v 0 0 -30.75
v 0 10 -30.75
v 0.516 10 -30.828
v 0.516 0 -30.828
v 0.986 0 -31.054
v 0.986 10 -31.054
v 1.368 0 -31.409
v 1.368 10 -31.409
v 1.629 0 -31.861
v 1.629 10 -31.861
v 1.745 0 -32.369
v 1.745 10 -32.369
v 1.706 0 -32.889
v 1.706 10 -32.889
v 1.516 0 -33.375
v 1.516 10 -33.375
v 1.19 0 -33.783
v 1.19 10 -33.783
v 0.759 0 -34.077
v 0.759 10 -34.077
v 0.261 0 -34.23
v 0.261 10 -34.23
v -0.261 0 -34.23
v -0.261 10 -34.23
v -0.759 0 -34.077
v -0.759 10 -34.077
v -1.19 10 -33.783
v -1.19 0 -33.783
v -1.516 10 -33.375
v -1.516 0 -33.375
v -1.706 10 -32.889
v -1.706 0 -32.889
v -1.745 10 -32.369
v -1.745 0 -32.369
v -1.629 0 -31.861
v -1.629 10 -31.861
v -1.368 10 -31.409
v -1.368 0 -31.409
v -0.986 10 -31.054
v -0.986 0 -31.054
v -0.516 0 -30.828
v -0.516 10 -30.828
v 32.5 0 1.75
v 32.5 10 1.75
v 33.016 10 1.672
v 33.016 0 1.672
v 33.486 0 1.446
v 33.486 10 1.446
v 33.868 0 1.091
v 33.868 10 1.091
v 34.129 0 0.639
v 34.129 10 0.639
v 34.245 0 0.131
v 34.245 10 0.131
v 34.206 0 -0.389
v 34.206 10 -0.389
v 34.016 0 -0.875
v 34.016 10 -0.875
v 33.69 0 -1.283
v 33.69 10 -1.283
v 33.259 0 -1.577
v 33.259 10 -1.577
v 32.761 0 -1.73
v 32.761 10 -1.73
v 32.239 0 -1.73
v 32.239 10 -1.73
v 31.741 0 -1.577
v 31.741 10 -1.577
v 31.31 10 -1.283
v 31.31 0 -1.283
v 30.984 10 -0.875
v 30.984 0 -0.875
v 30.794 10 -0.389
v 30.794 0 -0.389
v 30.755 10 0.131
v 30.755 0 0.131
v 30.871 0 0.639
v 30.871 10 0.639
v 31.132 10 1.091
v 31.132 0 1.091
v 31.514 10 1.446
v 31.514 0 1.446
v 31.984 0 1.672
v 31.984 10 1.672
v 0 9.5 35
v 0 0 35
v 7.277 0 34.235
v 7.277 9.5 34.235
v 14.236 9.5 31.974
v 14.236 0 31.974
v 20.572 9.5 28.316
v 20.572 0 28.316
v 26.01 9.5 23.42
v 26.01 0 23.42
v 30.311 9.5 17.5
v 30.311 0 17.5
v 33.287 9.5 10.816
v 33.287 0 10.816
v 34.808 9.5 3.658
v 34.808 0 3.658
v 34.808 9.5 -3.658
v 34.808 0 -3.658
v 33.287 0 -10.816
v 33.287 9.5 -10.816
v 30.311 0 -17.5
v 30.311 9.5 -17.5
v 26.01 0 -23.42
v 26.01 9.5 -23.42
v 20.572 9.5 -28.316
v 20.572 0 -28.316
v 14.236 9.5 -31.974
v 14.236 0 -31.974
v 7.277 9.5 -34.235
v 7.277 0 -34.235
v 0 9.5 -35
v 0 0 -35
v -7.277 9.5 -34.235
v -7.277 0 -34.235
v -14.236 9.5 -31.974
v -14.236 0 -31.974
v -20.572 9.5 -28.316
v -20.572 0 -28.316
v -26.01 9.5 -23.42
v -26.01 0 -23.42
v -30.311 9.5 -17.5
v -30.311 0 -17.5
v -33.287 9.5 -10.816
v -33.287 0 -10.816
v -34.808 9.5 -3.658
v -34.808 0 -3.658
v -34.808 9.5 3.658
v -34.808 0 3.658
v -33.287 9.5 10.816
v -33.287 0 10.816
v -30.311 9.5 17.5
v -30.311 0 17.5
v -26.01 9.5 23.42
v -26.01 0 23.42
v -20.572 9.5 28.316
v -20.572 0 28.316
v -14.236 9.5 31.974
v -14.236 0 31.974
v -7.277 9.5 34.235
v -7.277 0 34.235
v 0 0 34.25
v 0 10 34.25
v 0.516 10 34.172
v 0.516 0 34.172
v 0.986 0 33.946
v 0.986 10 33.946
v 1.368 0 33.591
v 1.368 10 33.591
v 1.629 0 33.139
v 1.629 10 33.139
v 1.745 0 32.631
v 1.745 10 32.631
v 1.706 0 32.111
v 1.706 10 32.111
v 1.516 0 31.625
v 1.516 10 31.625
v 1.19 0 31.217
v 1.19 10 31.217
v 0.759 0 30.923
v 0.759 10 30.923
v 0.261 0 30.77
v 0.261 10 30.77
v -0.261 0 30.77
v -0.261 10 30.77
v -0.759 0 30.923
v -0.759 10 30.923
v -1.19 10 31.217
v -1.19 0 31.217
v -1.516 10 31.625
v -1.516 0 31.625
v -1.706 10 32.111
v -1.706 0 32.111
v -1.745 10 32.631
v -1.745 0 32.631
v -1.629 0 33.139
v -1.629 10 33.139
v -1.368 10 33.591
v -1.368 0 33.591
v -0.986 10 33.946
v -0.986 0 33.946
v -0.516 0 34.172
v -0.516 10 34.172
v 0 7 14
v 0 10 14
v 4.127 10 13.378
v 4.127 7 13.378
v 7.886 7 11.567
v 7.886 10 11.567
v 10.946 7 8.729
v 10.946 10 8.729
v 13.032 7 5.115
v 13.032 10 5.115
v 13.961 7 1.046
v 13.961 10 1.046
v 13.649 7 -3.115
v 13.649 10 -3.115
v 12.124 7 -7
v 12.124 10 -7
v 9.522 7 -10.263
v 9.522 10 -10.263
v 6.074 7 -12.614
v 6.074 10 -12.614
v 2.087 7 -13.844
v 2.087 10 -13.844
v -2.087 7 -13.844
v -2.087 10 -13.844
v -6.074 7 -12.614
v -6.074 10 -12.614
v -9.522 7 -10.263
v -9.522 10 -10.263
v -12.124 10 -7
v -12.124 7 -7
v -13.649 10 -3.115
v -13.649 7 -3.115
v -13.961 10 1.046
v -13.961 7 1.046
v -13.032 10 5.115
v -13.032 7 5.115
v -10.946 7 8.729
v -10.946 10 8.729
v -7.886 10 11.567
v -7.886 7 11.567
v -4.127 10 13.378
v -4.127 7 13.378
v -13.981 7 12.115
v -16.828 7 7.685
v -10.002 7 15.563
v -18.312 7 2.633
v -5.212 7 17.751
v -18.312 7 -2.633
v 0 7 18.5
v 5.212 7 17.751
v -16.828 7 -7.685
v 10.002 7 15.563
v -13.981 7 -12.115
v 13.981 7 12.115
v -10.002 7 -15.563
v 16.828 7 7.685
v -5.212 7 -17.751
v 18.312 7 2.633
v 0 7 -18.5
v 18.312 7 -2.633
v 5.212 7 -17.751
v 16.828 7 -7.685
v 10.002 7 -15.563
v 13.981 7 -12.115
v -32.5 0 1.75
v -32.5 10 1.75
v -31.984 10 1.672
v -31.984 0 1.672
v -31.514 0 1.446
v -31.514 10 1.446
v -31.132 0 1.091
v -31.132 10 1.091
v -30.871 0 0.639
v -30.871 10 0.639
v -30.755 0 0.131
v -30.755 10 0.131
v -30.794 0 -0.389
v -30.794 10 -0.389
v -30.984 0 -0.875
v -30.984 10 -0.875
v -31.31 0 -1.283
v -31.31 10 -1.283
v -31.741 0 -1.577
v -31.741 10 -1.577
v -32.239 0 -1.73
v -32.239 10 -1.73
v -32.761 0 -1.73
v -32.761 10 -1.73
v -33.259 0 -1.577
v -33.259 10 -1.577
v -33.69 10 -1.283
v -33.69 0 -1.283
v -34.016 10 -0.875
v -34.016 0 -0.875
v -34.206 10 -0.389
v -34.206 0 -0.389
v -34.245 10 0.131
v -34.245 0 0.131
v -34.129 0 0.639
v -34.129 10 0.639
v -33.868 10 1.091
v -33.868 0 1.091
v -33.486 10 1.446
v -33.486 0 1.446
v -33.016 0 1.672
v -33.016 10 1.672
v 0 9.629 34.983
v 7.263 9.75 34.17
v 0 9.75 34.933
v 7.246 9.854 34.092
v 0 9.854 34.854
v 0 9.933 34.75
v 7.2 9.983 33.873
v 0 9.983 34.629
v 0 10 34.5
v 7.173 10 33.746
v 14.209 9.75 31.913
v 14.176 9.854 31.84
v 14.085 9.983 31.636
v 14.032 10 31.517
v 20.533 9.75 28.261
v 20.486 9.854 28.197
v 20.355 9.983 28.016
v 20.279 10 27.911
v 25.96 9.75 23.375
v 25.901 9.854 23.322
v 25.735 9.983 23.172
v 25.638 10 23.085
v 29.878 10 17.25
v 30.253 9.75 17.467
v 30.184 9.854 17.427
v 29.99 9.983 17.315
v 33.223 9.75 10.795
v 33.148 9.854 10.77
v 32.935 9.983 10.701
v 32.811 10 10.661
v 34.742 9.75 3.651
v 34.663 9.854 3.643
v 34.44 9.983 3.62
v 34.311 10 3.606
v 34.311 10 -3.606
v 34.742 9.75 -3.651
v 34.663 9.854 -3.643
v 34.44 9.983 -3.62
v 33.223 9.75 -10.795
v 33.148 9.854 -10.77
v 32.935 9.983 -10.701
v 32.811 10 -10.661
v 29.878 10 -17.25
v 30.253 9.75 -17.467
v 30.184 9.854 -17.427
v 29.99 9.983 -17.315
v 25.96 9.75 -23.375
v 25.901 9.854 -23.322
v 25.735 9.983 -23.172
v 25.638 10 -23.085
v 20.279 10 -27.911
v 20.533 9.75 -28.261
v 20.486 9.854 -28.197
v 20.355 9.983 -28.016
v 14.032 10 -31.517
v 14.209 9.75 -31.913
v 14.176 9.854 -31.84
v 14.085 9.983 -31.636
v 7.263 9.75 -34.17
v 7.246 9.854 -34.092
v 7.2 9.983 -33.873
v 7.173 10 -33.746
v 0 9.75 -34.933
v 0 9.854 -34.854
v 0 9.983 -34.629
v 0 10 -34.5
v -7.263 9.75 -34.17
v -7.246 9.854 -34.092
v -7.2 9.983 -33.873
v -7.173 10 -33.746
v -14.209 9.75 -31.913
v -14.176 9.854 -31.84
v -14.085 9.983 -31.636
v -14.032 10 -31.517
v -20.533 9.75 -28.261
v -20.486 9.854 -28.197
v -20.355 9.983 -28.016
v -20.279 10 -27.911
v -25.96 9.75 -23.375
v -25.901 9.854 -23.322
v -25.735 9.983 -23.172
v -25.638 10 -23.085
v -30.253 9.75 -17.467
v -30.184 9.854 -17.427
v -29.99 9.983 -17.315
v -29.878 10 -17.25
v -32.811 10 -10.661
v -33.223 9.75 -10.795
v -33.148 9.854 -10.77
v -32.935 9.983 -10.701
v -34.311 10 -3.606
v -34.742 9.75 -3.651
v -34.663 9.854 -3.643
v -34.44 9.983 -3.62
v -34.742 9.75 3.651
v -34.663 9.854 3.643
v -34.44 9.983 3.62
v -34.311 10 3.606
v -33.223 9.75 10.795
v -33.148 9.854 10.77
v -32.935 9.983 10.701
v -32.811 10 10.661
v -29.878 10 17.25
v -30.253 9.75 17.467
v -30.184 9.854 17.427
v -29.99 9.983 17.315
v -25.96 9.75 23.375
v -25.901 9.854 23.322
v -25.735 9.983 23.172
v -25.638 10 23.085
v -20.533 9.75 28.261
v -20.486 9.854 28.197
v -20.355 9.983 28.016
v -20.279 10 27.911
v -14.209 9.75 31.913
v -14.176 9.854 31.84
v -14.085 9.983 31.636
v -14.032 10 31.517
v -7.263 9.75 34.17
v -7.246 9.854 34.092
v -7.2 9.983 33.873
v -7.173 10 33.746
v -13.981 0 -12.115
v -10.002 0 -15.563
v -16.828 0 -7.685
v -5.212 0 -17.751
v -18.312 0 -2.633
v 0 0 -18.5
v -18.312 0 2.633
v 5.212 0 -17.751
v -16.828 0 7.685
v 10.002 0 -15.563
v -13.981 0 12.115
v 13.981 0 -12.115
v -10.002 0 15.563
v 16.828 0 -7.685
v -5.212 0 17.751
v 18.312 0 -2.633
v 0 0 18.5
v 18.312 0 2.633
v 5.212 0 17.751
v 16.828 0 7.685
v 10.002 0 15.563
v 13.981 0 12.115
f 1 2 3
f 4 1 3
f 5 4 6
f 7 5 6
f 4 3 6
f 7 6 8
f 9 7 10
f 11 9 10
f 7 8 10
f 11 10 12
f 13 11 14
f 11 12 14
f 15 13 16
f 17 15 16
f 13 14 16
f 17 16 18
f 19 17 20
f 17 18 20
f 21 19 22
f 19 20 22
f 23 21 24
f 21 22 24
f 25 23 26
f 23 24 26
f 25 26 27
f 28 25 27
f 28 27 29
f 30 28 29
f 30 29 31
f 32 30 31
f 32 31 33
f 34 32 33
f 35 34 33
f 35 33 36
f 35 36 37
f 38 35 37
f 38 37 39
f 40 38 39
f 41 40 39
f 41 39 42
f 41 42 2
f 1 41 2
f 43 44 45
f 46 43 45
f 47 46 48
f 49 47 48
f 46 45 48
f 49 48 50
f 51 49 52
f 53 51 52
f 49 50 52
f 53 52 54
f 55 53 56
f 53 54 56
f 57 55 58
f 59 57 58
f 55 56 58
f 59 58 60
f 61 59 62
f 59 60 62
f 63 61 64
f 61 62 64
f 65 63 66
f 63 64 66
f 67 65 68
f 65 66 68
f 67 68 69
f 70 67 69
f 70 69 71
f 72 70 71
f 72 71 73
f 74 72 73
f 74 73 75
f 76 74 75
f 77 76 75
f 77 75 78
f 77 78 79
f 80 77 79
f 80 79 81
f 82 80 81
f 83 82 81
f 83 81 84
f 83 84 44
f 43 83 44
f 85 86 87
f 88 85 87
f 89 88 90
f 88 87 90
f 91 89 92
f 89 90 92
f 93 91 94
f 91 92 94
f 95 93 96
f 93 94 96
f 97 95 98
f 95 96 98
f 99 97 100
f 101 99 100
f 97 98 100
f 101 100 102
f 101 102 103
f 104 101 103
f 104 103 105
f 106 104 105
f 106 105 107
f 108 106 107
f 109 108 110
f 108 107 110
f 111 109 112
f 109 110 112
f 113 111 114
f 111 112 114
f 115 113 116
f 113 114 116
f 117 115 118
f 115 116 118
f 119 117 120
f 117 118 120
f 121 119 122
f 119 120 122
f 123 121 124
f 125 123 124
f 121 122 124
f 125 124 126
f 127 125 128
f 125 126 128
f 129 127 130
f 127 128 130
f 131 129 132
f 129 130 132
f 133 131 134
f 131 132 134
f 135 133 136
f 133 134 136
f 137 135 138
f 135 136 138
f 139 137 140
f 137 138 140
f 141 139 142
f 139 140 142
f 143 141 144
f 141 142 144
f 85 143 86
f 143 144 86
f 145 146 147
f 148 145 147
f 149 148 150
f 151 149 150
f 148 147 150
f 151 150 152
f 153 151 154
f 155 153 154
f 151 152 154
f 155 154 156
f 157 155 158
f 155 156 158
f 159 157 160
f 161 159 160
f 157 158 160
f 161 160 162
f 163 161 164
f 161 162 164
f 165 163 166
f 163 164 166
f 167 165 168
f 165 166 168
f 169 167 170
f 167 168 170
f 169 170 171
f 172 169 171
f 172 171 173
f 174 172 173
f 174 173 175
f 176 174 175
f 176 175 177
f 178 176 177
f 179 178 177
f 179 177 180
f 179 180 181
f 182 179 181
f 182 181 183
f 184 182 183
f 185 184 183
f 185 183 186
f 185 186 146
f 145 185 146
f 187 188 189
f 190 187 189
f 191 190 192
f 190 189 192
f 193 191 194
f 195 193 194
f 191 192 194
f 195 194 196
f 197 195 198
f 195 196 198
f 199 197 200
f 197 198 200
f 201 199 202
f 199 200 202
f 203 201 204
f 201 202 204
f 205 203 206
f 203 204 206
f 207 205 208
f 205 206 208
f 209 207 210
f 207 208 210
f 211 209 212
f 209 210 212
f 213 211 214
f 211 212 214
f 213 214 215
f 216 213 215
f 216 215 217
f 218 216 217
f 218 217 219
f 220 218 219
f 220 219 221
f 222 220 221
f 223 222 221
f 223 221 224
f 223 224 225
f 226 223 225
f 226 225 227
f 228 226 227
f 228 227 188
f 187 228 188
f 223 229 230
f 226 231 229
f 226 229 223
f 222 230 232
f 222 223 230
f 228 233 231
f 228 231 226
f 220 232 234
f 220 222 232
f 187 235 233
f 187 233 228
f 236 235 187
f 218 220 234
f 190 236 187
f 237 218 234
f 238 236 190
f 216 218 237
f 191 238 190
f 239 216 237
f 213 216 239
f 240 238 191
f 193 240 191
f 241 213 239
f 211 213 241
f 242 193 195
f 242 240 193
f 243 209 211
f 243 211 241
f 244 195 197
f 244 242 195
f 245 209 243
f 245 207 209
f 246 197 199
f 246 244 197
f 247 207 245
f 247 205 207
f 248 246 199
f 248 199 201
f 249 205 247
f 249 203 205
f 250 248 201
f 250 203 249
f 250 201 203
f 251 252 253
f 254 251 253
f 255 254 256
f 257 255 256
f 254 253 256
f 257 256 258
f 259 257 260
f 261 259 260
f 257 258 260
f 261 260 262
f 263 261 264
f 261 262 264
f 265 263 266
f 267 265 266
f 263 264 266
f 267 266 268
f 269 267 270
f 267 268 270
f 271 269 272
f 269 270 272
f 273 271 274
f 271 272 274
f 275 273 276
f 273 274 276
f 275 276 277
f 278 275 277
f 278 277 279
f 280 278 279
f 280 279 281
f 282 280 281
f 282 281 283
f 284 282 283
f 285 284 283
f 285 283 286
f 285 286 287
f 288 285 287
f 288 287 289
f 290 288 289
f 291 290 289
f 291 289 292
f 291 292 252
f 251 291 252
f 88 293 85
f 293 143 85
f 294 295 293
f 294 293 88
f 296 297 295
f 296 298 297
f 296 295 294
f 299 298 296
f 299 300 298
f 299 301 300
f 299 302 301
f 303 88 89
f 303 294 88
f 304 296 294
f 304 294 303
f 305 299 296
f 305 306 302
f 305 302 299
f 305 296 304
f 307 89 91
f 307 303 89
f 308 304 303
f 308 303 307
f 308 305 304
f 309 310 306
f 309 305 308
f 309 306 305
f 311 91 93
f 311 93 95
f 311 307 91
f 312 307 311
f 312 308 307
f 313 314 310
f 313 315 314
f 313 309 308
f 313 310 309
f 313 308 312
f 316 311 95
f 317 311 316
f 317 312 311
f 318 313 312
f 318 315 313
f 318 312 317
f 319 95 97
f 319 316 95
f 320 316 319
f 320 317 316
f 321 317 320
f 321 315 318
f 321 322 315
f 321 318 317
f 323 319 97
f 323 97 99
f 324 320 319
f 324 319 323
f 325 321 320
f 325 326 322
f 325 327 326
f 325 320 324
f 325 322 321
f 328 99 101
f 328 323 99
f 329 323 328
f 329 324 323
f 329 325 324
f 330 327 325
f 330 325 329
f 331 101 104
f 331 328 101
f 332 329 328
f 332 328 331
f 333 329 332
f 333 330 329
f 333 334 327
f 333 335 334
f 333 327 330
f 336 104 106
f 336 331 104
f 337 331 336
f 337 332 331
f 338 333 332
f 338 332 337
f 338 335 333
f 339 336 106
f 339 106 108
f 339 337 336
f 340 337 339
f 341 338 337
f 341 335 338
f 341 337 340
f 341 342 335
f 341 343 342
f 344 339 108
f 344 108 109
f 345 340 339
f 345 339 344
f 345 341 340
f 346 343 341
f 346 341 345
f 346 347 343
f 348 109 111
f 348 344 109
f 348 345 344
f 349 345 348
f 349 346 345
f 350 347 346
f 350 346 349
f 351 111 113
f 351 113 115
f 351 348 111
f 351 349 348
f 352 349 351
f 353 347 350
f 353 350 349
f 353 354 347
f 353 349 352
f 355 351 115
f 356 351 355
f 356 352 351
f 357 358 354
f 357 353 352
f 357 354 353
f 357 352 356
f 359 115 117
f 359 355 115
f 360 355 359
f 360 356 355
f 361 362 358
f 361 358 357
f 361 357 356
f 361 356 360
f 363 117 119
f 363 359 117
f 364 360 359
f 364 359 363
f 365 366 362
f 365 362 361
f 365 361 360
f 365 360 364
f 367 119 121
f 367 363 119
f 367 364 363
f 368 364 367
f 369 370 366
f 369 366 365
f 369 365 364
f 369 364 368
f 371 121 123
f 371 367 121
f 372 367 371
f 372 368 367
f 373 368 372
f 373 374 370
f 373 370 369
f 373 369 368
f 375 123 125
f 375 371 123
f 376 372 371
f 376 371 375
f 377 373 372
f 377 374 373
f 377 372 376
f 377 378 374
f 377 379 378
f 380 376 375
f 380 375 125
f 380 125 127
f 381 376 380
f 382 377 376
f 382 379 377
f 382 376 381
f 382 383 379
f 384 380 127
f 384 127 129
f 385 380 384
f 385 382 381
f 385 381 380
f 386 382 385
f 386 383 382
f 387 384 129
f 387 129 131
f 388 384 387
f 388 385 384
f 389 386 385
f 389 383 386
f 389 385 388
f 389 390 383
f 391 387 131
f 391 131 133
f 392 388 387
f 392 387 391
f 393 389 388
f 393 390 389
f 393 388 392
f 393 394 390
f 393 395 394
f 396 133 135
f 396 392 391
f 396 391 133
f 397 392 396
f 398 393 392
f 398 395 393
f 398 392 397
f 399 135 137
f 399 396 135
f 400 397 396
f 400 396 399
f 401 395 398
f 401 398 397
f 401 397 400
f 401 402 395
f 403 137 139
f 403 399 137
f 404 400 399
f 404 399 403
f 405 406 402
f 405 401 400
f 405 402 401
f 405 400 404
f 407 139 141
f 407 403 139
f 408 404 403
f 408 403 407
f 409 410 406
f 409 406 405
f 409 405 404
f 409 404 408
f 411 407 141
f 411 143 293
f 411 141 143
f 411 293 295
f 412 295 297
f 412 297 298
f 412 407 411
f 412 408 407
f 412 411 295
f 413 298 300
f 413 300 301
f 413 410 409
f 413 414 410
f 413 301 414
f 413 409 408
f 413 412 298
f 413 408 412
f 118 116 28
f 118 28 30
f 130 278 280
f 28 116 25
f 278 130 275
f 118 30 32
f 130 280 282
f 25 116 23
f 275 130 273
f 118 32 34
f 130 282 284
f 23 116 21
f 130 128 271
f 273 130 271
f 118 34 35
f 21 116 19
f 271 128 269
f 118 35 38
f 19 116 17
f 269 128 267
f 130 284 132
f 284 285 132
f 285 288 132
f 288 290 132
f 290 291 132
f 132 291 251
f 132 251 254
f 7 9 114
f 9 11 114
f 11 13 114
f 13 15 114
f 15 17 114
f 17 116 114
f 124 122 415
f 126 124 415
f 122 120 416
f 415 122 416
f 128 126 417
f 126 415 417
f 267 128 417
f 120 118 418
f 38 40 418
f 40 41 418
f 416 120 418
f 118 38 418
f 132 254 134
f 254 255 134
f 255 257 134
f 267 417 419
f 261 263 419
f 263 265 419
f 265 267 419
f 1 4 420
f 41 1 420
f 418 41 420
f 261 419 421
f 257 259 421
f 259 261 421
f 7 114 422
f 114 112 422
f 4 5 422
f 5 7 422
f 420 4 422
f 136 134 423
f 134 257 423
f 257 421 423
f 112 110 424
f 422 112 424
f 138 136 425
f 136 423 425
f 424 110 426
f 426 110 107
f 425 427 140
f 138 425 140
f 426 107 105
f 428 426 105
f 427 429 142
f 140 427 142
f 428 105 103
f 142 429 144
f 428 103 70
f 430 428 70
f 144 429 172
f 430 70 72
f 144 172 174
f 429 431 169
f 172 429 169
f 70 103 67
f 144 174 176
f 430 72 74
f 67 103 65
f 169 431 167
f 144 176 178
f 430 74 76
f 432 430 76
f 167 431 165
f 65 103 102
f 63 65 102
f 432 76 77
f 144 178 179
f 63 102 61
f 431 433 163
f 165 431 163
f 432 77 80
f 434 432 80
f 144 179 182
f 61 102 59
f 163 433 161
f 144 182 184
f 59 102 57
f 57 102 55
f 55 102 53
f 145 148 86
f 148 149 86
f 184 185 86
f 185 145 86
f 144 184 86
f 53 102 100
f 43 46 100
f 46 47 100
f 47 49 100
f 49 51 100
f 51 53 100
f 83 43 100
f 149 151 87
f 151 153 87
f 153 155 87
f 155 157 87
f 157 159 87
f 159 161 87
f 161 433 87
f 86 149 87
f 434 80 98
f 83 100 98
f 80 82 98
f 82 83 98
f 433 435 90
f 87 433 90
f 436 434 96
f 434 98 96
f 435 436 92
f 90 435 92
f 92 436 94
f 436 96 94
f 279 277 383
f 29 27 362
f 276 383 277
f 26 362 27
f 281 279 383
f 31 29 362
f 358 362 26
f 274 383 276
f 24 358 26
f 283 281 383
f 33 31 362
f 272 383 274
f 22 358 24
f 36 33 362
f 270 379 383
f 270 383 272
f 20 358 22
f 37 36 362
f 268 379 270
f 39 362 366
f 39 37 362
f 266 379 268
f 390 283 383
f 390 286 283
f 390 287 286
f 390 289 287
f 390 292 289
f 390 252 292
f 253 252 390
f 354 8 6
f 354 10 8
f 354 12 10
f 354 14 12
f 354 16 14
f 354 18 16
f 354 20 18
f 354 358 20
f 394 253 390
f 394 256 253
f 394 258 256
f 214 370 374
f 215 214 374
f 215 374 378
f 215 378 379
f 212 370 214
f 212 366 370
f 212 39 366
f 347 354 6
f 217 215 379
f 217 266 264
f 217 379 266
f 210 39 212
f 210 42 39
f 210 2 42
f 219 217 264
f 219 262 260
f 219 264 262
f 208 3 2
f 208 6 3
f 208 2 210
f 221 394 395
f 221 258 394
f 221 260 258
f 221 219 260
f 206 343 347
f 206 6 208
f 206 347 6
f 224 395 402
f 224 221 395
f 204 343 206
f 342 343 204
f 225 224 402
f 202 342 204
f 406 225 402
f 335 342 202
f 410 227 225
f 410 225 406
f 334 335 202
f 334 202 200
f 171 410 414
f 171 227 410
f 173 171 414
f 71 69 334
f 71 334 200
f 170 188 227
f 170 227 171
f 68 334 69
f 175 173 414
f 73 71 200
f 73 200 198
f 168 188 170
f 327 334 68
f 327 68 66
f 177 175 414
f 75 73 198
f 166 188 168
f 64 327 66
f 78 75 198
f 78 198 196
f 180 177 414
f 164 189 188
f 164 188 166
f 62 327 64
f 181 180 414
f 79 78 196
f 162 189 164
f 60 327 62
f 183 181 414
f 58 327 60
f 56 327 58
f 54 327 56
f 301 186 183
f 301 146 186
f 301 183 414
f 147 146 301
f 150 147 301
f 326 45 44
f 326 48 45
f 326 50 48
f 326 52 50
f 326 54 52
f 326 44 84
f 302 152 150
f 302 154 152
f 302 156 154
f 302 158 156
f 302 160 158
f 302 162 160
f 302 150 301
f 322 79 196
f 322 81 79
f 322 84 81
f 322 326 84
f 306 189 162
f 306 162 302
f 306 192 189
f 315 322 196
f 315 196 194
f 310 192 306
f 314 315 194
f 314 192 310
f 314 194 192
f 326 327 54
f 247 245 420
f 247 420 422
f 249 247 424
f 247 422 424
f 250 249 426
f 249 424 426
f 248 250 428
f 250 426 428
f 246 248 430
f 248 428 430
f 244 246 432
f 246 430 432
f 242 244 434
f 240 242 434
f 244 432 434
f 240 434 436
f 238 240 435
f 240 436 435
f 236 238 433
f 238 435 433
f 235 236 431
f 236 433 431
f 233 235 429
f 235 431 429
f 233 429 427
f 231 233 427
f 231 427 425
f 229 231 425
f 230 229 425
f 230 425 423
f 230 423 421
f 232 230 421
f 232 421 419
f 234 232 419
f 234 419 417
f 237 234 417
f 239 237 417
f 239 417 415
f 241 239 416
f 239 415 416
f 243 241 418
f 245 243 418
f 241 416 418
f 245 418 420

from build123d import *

# Parameters (mm, degrees)
SKETCH1_R           = 35
BOSS_EXTRUDE1_DEPTH = 10
SKETCH2_R           = 1.75
CUT_EXTRUDE1_DEPTH  = 51.497524692
SKETCH4_R           = 18.5
CUT_EXTRUDE2_DEPTH  = 7
SKETCH5_R           = 14
CUT_EXTRUDE3_DEPTH  = 51.497524692
FILLET1_R           = 0.5


with BuildPart() as part:
    # Sketch1 → Boss-Extrude1 (new body)
    with BuildSketch(Plane(origin=(0, 0, 0), x_dir=(1, 0, 0), z_dir=(0, 1, 0))):
        with Locations(Location((0, 0, 0), (0, 0, 270))):
            Circle(SKETCH1_R)
    extrude(amount=BOSS_EXTRUDE1_DEPTH)

    # Sketch2 → Cut-Extrude1 (cut, through all)
    with BuildSketch(Plane(origin=(0, 10, 0), x_dir=(1, 0, 0), z_dir=(0, 1, 0))):
        with Locations(Location((0, 32.5, 0), (0, 0, 270))):
            Circle(SKETCH2_R)
        with Locations(Location((32.5, 0, 0), (0, 0, 270))):
            Circle(SKETCH2_R)
        with Locations(Location((0, -32.5, 0), (0, 0, 270))):
            Circle(SKETCH2_R)
        with Locations(Location((-32.5, 0, 0), (0, 0, 270))):
            Circle(SKETCH2_R)
    extrude(amount=-CUT_EXTRUDE1_DEPTH, mode=Mode.SUBTRACT)

    # Sketch4 → Cut-Extrude2 (cut)
    with BuildSketch(Plane.XZ):
        with Locations(Location((0, 0, 0), (0, 0, 270))):
            Circle(SKETCH4_R)
    extrude(amount=-CUT_EXTRUDE2_DEPTH, mode=Mode.SUBTRACT)

    # Sketch5 → Cut-Extrude3 (cut, through all)
    with BuildSketch(Plane(origin=(0, 10, 0), x_dir=(1, 0, 0), z_dir=(0, 1, 0))):
        with Locations(Location((0, 0, 0), (0, 0, 270))):
            Circle(SKETCH5_R)
    extrude(amount=-CUT_EXTRUDE3_DEPTH, mode=Mode.SUBTRACT)

    # Fillet1
    fillet1_edges = [part.edges().sort_by_distance(p)[0] for p in [
        (0, 10, -35),
    ]]
    fillet(fillet1_edges, radius=FILLET1_R)


solid = part.part
